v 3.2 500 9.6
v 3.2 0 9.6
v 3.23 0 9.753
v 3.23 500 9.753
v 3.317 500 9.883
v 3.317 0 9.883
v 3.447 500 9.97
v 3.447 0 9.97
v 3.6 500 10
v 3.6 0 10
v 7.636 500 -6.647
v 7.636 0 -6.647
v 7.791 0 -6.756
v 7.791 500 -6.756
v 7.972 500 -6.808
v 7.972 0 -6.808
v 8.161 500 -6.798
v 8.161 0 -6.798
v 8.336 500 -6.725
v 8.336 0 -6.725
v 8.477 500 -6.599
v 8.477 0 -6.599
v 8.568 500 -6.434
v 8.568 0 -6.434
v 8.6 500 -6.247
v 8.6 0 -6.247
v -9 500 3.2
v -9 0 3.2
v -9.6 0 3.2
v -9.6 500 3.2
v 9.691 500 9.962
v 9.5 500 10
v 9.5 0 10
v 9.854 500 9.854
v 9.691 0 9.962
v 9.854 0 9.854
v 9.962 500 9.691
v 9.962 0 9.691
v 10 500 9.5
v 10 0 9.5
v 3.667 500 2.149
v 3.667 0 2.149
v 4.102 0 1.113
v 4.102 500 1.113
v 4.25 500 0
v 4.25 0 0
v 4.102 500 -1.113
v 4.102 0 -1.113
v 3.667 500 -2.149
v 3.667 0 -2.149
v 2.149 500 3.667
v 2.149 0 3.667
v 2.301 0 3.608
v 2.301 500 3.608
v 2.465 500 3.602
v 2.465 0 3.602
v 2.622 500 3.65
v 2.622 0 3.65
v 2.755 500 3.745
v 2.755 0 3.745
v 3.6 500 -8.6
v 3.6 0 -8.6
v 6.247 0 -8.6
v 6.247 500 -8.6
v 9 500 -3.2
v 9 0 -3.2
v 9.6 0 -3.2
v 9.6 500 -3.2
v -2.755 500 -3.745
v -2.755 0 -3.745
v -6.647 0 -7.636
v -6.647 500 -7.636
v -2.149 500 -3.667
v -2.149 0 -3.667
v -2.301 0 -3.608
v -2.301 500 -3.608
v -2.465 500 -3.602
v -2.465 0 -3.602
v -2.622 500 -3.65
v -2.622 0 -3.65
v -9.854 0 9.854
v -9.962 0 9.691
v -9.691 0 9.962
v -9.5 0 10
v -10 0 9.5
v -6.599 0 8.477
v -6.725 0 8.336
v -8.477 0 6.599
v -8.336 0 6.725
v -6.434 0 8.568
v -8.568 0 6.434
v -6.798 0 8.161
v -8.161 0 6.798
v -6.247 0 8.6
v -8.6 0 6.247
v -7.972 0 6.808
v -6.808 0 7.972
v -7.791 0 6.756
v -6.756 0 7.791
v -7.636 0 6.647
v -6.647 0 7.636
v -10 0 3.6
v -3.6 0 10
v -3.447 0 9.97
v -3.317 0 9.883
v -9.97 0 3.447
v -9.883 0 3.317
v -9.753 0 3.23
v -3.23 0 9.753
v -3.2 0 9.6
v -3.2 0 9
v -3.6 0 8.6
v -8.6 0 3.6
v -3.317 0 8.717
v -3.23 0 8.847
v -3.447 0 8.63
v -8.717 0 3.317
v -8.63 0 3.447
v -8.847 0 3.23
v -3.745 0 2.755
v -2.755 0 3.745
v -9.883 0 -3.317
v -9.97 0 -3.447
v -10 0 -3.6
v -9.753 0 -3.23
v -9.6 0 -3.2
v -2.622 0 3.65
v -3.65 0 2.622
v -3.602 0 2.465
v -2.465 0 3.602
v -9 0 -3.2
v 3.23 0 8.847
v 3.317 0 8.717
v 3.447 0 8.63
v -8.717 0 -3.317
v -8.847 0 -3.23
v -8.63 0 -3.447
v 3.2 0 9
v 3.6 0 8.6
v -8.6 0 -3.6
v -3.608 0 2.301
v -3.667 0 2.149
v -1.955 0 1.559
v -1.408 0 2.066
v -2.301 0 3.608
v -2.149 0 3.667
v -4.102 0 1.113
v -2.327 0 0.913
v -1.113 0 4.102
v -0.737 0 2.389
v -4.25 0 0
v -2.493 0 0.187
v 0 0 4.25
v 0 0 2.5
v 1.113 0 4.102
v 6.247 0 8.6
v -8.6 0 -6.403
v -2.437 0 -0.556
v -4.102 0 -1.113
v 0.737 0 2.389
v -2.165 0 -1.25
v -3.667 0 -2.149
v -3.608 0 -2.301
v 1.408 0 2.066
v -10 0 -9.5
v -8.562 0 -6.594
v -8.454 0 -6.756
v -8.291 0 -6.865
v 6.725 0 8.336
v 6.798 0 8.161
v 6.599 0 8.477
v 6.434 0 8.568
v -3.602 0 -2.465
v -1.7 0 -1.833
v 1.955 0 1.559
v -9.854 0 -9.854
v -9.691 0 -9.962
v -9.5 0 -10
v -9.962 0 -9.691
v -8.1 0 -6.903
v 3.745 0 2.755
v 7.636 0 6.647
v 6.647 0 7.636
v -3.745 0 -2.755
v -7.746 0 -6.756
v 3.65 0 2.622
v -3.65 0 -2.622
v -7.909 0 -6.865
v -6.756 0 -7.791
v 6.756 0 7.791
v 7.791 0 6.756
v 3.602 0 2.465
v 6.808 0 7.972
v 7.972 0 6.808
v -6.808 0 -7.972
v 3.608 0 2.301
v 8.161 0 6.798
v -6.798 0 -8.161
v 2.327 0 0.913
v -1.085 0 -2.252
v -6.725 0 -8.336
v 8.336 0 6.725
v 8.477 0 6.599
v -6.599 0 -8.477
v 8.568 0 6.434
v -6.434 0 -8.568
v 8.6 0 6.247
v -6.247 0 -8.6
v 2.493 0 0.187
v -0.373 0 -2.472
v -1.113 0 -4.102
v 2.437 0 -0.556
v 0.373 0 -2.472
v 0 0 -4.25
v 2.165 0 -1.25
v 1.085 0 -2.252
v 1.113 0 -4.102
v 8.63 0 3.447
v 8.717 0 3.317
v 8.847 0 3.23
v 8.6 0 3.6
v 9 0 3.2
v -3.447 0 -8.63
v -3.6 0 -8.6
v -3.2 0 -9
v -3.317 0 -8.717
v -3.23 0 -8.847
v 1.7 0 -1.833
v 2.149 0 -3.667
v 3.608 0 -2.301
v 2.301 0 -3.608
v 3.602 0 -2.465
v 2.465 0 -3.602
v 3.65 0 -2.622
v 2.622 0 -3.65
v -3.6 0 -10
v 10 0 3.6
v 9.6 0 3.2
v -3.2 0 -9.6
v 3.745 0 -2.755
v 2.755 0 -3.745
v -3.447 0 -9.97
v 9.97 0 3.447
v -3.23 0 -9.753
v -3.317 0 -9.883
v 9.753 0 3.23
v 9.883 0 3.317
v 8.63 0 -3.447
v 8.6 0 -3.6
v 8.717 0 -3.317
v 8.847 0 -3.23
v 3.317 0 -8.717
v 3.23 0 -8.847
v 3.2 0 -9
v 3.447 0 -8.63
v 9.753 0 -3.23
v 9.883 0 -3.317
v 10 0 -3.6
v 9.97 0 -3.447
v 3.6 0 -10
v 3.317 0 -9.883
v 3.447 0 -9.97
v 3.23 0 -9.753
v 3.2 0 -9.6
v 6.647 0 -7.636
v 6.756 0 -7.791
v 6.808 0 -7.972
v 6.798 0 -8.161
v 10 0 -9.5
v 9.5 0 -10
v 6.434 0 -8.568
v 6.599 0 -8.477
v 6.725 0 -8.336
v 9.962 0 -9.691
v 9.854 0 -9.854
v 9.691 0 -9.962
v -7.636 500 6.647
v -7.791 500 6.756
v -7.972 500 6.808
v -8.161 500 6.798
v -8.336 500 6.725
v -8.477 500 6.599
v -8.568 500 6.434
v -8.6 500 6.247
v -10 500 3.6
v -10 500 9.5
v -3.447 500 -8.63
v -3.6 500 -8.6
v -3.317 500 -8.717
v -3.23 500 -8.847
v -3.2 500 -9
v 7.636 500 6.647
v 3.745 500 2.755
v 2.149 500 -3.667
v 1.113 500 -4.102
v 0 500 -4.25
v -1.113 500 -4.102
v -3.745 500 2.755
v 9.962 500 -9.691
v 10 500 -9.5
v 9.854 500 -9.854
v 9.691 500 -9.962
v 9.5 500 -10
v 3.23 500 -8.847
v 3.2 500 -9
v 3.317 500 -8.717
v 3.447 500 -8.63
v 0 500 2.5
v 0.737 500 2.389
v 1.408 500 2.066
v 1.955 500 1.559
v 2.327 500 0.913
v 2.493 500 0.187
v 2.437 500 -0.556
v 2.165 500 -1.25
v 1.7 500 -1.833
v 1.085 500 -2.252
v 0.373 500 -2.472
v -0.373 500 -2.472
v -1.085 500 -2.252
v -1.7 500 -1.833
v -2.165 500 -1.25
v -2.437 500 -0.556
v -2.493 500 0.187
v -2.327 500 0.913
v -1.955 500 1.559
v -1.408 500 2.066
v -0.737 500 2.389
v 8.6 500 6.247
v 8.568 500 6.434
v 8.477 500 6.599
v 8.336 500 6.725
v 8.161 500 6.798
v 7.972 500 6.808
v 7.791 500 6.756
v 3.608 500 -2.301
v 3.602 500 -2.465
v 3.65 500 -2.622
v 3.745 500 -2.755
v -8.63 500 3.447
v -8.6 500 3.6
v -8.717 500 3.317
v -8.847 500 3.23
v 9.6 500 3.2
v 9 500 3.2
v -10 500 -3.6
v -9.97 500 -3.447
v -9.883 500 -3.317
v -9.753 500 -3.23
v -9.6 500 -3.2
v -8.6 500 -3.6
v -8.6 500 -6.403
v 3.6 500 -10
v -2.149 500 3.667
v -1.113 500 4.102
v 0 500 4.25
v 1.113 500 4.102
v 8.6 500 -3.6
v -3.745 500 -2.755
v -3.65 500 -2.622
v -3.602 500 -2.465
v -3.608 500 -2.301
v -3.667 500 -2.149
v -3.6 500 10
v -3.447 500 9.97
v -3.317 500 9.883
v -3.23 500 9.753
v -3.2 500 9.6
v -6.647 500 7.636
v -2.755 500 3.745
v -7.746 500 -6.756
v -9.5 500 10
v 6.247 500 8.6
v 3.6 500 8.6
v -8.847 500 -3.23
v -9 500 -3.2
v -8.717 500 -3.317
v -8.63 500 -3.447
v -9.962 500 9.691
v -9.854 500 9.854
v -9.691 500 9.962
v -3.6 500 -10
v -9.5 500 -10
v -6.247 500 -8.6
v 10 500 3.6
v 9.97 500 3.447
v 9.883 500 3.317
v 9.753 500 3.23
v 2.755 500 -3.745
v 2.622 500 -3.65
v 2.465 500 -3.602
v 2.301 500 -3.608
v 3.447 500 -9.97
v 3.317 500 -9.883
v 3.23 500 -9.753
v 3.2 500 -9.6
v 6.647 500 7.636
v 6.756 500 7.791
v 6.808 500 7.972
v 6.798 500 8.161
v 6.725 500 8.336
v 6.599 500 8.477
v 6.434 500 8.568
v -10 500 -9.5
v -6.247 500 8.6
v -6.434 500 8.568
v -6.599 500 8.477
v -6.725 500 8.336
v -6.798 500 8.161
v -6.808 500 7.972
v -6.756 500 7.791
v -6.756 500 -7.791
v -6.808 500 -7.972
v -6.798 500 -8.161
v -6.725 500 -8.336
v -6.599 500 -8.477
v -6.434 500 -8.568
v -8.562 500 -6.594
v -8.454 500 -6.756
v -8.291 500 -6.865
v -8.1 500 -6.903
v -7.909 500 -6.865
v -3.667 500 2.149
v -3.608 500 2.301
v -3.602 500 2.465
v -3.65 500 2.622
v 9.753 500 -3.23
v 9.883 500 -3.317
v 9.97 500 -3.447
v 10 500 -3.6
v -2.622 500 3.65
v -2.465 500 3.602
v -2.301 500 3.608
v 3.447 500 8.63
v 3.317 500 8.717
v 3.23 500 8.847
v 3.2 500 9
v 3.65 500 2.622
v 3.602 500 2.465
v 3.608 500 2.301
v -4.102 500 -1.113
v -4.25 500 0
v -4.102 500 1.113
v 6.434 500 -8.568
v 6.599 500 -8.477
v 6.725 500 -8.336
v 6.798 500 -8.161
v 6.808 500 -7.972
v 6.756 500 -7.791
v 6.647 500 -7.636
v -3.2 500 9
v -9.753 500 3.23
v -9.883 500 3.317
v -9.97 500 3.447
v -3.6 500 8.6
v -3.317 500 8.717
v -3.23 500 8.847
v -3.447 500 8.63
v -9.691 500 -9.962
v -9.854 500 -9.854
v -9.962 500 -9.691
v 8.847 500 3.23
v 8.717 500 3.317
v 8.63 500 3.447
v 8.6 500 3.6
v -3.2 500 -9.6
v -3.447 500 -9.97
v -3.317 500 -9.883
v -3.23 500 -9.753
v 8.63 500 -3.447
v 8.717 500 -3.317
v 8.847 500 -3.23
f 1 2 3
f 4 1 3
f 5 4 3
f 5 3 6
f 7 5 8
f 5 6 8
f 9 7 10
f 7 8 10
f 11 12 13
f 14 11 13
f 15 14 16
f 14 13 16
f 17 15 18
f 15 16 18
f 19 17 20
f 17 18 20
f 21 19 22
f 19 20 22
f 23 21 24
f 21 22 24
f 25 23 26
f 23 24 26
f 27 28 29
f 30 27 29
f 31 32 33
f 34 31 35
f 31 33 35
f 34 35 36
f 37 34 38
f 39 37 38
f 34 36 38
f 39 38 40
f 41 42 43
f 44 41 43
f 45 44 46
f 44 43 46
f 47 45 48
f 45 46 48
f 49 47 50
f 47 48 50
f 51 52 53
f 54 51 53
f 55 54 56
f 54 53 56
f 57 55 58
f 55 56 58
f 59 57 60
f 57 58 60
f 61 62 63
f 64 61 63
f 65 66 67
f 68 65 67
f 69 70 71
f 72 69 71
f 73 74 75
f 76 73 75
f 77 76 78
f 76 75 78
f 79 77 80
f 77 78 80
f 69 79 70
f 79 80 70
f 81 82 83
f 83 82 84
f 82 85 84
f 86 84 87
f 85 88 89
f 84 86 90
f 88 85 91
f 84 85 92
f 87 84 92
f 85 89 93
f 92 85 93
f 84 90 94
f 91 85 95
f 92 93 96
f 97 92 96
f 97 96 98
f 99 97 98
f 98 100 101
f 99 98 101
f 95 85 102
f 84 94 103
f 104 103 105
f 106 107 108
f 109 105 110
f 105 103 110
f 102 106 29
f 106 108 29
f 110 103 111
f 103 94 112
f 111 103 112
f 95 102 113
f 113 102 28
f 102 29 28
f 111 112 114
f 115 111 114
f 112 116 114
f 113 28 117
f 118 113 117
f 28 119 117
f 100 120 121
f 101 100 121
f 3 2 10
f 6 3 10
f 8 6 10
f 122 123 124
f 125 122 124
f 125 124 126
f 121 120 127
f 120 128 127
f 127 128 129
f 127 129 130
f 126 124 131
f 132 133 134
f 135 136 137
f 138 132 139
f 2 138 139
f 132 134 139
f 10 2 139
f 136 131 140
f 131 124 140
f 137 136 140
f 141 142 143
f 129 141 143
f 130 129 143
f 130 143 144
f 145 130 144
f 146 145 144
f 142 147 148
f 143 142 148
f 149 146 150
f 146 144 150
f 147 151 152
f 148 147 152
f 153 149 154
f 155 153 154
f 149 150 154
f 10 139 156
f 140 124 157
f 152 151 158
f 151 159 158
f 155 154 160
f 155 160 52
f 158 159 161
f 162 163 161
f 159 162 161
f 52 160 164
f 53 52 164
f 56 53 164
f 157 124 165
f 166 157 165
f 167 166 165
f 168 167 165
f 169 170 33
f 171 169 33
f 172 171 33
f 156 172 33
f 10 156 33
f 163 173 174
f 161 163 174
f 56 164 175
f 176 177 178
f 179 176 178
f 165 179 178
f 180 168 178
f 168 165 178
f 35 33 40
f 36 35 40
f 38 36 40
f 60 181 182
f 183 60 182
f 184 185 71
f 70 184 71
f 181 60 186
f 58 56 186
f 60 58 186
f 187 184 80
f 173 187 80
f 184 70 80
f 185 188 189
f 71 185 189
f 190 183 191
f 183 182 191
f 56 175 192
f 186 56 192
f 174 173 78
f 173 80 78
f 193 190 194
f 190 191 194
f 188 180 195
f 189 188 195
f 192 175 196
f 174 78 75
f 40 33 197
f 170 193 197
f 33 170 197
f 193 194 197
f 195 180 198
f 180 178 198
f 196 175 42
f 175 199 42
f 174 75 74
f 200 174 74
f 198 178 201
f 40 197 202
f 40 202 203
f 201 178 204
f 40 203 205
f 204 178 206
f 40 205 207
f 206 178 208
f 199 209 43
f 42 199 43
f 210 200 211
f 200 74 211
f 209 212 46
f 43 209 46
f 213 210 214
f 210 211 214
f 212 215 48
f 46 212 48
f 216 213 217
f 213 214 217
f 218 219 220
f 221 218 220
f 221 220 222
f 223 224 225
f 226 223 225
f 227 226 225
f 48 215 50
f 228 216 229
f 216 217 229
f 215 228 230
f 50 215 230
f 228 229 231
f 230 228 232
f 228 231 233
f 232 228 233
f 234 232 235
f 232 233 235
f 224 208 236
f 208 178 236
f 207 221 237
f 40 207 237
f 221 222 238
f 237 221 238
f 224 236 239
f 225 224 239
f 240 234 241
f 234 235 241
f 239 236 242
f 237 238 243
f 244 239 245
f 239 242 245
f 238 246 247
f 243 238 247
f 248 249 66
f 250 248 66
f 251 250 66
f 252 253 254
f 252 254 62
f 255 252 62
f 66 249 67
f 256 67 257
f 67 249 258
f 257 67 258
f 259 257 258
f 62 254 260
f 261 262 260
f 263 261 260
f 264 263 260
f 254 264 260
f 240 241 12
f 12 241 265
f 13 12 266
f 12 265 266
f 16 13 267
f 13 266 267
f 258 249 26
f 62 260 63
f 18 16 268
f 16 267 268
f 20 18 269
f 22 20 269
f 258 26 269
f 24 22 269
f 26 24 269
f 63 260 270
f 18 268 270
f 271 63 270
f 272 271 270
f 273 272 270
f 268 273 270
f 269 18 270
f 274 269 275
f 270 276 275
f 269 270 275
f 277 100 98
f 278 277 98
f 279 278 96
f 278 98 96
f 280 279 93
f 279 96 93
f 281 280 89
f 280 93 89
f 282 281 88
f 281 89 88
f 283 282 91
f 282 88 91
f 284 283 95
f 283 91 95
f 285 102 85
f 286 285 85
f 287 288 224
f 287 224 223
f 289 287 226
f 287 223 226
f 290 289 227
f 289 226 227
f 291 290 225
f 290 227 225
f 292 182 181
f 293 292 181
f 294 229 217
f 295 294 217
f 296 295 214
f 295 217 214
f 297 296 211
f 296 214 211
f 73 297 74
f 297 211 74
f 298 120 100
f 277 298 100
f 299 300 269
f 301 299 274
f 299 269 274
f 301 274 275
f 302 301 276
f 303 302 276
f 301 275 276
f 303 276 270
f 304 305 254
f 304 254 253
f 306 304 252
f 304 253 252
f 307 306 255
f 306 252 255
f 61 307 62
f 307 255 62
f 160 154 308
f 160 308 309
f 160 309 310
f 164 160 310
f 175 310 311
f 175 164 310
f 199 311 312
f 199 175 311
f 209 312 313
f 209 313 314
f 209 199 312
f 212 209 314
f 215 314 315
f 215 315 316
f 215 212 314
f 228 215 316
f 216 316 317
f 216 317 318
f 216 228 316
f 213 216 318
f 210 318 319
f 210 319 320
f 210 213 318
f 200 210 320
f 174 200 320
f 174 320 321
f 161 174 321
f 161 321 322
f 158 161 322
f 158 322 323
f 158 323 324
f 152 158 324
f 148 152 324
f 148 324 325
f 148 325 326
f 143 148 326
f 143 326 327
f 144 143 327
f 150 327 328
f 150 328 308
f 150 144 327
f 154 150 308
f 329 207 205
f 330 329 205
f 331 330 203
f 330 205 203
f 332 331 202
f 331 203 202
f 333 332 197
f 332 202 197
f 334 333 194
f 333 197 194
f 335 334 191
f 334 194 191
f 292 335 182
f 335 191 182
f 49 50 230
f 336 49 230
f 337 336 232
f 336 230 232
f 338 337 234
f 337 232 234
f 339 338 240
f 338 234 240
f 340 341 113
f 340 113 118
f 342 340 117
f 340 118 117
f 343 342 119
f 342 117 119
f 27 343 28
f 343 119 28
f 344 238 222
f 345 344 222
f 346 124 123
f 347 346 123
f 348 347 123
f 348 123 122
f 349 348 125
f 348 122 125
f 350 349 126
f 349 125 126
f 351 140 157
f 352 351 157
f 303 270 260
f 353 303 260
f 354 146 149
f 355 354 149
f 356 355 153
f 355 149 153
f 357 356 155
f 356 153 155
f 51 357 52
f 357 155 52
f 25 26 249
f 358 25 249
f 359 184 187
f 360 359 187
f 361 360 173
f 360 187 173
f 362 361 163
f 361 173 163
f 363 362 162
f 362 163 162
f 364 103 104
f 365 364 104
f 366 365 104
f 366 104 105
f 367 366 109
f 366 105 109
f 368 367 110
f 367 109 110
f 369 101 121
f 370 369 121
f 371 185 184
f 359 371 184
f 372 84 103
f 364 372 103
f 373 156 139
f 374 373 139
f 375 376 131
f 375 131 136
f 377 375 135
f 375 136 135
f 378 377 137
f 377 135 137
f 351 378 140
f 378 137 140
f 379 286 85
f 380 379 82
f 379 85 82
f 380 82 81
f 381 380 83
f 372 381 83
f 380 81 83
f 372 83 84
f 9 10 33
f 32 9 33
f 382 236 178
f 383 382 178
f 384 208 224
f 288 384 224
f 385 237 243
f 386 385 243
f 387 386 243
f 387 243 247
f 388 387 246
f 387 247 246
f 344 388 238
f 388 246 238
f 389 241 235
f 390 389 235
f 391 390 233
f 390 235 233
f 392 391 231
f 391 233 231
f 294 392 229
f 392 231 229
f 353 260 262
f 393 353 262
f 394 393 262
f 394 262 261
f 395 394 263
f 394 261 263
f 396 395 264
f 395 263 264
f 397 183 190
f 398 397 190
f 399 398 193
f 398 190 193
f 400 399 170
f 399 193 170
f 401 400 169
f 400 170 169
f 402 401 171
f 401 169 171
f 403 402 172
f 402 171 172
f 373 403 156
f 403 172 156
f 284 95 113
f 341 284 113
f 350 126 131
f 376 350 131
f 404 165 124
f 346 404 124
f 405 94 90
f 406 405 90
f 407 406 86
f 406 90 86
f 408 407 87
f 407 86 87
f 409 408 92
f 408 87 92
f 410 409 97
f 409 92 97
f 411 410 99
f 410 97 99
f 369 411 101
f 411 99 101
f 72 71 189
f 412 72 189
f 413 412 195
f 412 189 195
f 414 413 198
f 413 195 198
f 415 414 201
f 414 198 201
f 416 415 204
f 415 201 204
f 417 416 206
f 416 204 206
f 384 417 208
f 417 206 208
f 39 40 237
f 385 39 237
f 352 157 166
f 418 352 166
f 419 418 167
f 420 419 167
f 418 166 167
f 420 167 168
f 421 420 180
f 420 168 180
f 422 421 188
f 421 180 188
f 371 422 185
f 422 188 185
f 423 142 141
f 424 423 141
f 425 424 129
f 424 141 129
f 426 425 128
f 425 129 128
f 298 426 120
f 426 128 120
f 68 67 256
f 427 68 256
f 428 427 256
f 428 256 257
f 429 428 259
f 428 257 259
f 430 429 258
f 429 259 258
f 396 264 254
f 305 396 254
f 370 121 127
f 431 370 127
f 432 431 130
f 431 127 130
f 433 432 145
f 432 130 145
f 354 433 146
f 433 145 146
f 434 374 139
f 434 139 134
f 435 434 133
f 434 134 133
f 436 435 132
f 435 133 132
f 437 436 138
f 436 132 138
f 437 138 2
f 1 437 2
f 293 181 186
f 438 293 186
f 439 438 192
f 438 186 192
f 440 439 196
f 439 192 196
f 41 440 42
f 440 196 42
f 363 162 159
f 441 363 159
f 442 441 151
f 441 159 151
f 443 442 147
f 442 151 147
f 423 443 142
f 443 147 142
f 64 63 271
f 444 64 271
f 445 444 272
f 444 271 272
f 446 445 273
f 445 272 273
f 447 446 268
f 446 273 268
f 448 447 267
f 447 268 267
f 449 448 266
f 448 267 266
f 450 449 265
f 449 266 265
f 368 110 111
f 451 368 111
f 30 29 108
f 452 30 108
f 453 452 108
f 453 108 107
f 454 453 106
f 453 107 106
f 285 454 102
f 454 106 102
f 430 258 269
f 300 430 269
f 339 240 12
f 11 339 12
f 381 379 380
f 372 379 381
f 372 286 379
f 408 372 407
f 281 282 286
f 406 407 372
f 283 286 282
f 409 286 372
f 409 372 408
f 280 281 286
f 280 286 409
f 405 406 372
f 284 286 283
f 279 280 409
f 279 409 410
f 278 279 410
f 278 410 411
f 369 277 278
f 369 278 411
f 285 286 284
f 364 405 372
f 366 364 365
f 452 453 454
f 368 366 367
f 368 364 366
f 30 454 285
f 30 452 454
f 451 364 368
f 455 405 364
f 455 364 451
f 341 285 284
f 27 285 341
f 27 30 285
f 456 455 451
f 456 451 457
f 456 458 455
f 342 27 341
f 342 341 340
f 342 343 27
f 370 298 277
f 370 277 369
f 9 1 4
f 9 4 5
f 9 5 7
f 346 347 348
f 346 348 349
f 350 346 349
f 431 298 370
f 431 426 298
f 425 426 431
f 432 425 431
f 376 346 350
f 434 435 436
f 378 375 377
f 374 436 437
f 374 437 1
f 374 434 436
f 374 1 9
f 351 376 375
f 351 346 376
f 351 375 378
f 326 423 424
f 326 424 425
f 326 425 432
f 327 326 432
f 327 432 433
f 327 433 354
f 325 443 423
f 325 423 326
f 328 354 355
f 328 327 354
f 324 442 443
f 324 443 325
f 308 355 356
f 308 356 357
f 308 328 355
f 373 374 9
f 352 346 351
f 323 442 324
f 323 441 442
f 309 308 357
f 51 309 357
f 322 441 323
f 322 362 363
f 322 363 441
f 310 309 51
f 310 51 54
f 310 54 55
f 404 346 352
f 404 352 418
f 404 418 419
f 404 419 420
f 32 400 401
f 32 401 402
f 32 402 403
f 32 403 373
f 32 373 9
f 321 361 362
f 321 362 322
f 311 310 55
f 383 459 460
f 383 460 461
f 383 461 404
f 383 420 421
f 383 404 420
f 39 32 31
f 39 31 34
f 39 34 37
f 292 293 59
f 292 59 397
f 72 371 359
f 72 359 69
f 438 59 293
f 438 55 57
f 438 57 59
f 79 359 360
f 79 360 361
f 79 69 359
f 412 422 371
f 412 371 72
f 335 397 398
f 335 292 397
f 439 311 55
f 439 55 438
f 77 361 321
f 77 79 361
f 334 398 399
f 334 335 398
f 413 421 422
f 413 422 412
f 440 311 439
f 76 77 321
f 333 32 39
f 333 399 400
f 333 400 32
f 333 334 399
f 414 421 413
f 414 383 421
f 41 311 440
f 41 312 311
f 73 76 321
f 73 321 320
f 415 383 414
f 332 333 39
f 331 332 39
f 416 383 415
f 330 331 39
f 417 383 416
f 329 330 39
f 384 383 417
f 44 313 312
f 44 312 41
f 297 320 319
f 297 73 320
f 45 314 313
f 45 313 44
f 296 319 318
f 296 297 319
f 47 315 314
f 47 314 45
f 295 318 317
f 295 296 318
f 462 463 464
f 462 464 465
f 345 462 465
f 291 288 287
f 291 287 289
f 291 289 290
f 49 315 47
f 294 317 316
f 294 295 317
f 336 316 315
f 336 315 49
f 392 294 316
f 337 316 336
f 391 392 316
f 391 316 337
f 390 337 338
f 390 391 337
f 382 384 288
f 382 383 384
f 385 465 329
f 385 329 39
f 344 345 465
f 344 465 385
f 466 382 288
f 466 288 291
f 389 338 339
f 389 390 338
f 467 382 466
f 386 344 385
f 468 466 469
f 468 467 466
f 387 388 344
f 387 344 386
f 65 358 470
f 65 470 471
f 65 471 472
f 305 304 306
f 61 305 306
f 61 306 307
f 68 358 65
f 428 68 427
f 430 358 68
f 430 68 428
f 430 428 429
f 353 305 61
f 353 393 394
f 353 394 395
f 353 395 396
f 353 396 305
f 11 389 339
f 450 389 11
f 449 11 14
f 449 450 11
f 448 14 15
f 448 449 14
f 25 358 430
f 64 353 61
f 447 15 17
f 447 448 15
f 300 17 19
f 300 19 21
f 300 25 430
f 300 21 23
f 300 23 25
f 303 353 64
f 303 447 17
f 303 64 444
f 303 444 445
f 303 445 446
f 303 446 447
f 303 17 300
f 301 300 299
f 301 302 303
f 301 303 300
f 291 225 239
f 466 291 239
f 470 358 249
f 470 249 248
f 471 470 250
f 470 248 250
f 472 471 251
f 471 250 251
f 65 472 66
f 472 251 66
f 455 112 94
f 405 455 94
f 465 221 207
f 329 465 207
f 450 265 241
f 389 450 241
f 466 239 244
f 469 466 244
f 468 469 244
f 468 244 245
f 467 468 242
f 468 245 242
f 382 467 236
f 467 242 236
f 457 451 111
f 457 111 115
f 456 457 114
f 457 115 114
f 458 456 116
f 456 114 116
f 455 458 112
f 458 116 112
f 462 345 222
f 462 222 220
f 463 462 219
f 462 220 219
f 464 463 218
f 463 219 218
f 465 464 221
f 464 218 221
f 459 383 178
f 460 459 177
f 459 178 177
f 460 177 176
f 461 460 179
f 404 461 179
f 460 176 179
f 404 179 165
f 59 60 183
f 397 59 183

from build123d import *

# Parameters (mm, degrees)
SKETCH1_R           = 2.5
BOSS_EXTRUDE1_DEPTH = 500


with BuildPart() as part:
    # Sketch1 → Boss-Extrude1 (new body)
    with BuildSketch(Plane(origin=(0, 0, 0), x_dir=(1, 0, 0), z_dir=(0, 1, 0))):
        with BuildLine():
            Line((-6.247396549, 8.6), (-3.6, 8.6))
            ThreePointArc((-3.6, 8.6), (-3.317157288, 8.717157288), (-3.2, 9))
            Line((-3.2, 9), (-3.2, 9.6))
            ThreePointArc((-3.2, 9.6), (-3.317157288, 9.882842712), (-3.6, 10))
            Line((-3.6, 10), (-9.5, 10))
            ThreePointArc((-9.5, 10), (-9.853553391, 9.853553391), (-10, 9.5))
            Line((-10, 9.5), (-10, 3.6))
            ThreePointArc((-10, 3.6), (-9.882842712, 3.317157288), (-9.6, 3.2))
            Line((-9.6, 3.2), (-9, 3.2))
            ThreePointArc((-9, 3.2), (-8.717157288, 3.317157288), (-8.6, 3.6))
            Line((-8.6, 3.6), (-8.6, 6.402943725))
            ThreePointArc((-8.6, 6.402943725), (-8.291341716, 6.864883491), (-7.746446609, 6.756497116))
            Line((-7.746446609, 6.756497116), (-3.744782433, 2.75483294))
            ThreePointArc((-3.744782433, 2.75483294), (-3.602407081, 2.46495593), (-3.666932053, 2.148513281))
            ThreePointArc((-3.666932053, 2.148513281), (-4.25, 0), (-3.666932053, -2.148513281))
            ThreePointArc((-3.666932053, -2.148513281), (-3.602407081, -2.46495593), (-3.744782433, -2.75483294))
            Line((-3.744782433, -2.75483294), (-7.636458146, -6.646508652))
            ThreePointArc((-7.636458146, -6.646508652), (-8.251568164, -6.768861642), (-8.6, -6.247396549))
            Line((-8.6, -6.247396549), (-8.6, -3.6))
            ThreePointArc((-8.6, -3.6), (-8.717157288, -3.317157288), (-9, -3.2))
            Line((-9, -3.2), (-9.6, -3.2))
            ThreePointArc((-9.6, -3.2), (-9.882842712, -3.317157288), (-10, -3.6))
            Line((-10, -3.6), (-10, -9.5))
            ThreePointArc((-10, -9.5), (-9.853553391, -9.853553391), (-9.5, -10))
            Line((-9.5, -10), (-3.6, -10))
            ThreePointArc((-3.6, -10), (-3.317157288, -9.882842712), (-3.2, -9.6))
            Line((-3.2, -9.6), (-3.2, -9))
            ThreePointArc((-3.2, -9), (-3.317157288, -8.717157288), (-3.6, -8.6))
            Line((-3.6, -8.6), (-6.247396549, -8.6))
            ThreePointArc((-6.247396549, -8.6), (-6.768861642, -8.251568164), (-6.646508652, -7.636458146))
            Line((-6.646508652, -7.636458146), (-2.75483294, -3.744782433))
            ThreePointArc((-2.75483294, -3.744782433), (-2.46495593, -3.602407081), (-2.148513281, -3.666932053))
            ThreePointArc((-2.148513281, -3.666932053), (0, -4.25), (2.148513281, -3.666932053))
            ThreePointArc((2.148513281, -3.666932053), (2.46495593, -3.602407081), (2.75483294, -3.744782433))
            Line((2.75483294, -3.744782433), (6.646508652, -7.636458146))
            ThreePointArc((6.646508652, -7.636458146), (6.768861642, -8.251568164), (6.247396549, -8.6))
            Line((6.247396549, -8.6), (3.6, -8.6))
            ThreePointArc((3.6, -8.6), (3.317157288, -8.717157288), (3.2, -9))
            Line((3.2, -9), (3.2, -9.6))
            ThreePointArc((3.2, -9.6), (3.317157288, -9.882842712), (3.6, -10))
            Line((3.6, -10), (9.5, -10))
            ThreePointArc((9.5, -10), (9.853553391, -9.853553391), (10, -9.5))
            Line((10, -9.5), (10, -3.6))
            ThreePointArc((10, -3.6), (9.882842712, -3.317157288), (9.6, -3.2))
            Line((9.6, -3.2), (9, -3.2))
            ThreePointArc((9, -3.2), (8.717157288, -3.317157288), (8.6, -3.6))
            Line((8.6, -3.6), (8.6, -6.247396549))
            ThreePointArc((8.6, -6.247396549), (8.251568164, -6.768861642), (7.636458146, -6.646508652))
            Line((7.636458146, -6.646508652), (3.744782433, -2.75483294))
            ThreePointArc((3.744782433, -2.75483294), (3.602407081, -2.46495593), (3.666932053, -2.148513281))
            ThreePointArc((3.666932053, -2.148513281), (4.25, 0), (3.666932053, 2.148513281))
            ThreePointArc((3.666932053, 2.148513281), (3.602407081, 2.46495593), (3.744782433, 2.75483294))
            Line((3.744782433, 2.75483294), (7.636458146, 6.646508652))
            ThreePointArc((7.636458146, 6.646508652), (8.251568164, 6.768861642), (8.6, 6.247396549))
            Line((8.6, 6.247396549), (8.6, 3.6))
            ThreePointArc((8.6, 3.6), (8.717157288, 3.317157288), (9, 3.2))
            Line((9, 3.2), (9.6, 3.2))
            ThreePointArc((9.6, 3.2), (9.882842712, 3.317157288), (10, 3.6))
            Line((10, 3.6), (10, 9.5))
            ThreePointArc((10, 9.5), (9.853553391, 9.853553391), (9.5, 10))
            Line((9.5, 10), (3.6, 10))
            ThreePointArc((3.6, 10), (3.317157288, 9.882842712), (3.2, 9.6))
            Line((3.2, 9.6), (3.2, 9))
            ThreePointArc((3.2, 9), (3.317157288, 8.717157288), (3.6, 8.6))
            Line((3.6, 8.6), (6.247396549, 8.6))
            ThreePointArc((6.247396549, 8.6), (6.768861642, 8.251568164), (6.646508652, 7.636458146))
            Line((6.646508652, 7.636458146), (2.75483294, 3.744782433))
            ThreePointArc((2.75483294, 3.744782433), (2.46495593, 3.602407081), (2.148513281, 3.666932053))
            ThreePointArc((2.148513281, 3.666932053), (0, 4.25), (-2.148513281, 3.666932053))
            ThreePointArc((-2.148513281, 3.666932053), (-2.46495593, 3.602407081), (-2.75483294, 3.744782433))
            Line((-2.75483294, 3.744782433), (-6.646508652, 7.636458146))
            ThreePointArc((-6.646508652, 7.636458146), (-6.768861642, 8.251568164), (-6.247396549, 8.6))
        make_face()
        with Locations(Location((0, 0, 0), (0, 0, 270))):
            Circle(SKETCH1_R, mode=Mode.SUBTRACT)
    extrude(amount=BOSS_EXTRUDE1_DEPTH)


solid = part.part
